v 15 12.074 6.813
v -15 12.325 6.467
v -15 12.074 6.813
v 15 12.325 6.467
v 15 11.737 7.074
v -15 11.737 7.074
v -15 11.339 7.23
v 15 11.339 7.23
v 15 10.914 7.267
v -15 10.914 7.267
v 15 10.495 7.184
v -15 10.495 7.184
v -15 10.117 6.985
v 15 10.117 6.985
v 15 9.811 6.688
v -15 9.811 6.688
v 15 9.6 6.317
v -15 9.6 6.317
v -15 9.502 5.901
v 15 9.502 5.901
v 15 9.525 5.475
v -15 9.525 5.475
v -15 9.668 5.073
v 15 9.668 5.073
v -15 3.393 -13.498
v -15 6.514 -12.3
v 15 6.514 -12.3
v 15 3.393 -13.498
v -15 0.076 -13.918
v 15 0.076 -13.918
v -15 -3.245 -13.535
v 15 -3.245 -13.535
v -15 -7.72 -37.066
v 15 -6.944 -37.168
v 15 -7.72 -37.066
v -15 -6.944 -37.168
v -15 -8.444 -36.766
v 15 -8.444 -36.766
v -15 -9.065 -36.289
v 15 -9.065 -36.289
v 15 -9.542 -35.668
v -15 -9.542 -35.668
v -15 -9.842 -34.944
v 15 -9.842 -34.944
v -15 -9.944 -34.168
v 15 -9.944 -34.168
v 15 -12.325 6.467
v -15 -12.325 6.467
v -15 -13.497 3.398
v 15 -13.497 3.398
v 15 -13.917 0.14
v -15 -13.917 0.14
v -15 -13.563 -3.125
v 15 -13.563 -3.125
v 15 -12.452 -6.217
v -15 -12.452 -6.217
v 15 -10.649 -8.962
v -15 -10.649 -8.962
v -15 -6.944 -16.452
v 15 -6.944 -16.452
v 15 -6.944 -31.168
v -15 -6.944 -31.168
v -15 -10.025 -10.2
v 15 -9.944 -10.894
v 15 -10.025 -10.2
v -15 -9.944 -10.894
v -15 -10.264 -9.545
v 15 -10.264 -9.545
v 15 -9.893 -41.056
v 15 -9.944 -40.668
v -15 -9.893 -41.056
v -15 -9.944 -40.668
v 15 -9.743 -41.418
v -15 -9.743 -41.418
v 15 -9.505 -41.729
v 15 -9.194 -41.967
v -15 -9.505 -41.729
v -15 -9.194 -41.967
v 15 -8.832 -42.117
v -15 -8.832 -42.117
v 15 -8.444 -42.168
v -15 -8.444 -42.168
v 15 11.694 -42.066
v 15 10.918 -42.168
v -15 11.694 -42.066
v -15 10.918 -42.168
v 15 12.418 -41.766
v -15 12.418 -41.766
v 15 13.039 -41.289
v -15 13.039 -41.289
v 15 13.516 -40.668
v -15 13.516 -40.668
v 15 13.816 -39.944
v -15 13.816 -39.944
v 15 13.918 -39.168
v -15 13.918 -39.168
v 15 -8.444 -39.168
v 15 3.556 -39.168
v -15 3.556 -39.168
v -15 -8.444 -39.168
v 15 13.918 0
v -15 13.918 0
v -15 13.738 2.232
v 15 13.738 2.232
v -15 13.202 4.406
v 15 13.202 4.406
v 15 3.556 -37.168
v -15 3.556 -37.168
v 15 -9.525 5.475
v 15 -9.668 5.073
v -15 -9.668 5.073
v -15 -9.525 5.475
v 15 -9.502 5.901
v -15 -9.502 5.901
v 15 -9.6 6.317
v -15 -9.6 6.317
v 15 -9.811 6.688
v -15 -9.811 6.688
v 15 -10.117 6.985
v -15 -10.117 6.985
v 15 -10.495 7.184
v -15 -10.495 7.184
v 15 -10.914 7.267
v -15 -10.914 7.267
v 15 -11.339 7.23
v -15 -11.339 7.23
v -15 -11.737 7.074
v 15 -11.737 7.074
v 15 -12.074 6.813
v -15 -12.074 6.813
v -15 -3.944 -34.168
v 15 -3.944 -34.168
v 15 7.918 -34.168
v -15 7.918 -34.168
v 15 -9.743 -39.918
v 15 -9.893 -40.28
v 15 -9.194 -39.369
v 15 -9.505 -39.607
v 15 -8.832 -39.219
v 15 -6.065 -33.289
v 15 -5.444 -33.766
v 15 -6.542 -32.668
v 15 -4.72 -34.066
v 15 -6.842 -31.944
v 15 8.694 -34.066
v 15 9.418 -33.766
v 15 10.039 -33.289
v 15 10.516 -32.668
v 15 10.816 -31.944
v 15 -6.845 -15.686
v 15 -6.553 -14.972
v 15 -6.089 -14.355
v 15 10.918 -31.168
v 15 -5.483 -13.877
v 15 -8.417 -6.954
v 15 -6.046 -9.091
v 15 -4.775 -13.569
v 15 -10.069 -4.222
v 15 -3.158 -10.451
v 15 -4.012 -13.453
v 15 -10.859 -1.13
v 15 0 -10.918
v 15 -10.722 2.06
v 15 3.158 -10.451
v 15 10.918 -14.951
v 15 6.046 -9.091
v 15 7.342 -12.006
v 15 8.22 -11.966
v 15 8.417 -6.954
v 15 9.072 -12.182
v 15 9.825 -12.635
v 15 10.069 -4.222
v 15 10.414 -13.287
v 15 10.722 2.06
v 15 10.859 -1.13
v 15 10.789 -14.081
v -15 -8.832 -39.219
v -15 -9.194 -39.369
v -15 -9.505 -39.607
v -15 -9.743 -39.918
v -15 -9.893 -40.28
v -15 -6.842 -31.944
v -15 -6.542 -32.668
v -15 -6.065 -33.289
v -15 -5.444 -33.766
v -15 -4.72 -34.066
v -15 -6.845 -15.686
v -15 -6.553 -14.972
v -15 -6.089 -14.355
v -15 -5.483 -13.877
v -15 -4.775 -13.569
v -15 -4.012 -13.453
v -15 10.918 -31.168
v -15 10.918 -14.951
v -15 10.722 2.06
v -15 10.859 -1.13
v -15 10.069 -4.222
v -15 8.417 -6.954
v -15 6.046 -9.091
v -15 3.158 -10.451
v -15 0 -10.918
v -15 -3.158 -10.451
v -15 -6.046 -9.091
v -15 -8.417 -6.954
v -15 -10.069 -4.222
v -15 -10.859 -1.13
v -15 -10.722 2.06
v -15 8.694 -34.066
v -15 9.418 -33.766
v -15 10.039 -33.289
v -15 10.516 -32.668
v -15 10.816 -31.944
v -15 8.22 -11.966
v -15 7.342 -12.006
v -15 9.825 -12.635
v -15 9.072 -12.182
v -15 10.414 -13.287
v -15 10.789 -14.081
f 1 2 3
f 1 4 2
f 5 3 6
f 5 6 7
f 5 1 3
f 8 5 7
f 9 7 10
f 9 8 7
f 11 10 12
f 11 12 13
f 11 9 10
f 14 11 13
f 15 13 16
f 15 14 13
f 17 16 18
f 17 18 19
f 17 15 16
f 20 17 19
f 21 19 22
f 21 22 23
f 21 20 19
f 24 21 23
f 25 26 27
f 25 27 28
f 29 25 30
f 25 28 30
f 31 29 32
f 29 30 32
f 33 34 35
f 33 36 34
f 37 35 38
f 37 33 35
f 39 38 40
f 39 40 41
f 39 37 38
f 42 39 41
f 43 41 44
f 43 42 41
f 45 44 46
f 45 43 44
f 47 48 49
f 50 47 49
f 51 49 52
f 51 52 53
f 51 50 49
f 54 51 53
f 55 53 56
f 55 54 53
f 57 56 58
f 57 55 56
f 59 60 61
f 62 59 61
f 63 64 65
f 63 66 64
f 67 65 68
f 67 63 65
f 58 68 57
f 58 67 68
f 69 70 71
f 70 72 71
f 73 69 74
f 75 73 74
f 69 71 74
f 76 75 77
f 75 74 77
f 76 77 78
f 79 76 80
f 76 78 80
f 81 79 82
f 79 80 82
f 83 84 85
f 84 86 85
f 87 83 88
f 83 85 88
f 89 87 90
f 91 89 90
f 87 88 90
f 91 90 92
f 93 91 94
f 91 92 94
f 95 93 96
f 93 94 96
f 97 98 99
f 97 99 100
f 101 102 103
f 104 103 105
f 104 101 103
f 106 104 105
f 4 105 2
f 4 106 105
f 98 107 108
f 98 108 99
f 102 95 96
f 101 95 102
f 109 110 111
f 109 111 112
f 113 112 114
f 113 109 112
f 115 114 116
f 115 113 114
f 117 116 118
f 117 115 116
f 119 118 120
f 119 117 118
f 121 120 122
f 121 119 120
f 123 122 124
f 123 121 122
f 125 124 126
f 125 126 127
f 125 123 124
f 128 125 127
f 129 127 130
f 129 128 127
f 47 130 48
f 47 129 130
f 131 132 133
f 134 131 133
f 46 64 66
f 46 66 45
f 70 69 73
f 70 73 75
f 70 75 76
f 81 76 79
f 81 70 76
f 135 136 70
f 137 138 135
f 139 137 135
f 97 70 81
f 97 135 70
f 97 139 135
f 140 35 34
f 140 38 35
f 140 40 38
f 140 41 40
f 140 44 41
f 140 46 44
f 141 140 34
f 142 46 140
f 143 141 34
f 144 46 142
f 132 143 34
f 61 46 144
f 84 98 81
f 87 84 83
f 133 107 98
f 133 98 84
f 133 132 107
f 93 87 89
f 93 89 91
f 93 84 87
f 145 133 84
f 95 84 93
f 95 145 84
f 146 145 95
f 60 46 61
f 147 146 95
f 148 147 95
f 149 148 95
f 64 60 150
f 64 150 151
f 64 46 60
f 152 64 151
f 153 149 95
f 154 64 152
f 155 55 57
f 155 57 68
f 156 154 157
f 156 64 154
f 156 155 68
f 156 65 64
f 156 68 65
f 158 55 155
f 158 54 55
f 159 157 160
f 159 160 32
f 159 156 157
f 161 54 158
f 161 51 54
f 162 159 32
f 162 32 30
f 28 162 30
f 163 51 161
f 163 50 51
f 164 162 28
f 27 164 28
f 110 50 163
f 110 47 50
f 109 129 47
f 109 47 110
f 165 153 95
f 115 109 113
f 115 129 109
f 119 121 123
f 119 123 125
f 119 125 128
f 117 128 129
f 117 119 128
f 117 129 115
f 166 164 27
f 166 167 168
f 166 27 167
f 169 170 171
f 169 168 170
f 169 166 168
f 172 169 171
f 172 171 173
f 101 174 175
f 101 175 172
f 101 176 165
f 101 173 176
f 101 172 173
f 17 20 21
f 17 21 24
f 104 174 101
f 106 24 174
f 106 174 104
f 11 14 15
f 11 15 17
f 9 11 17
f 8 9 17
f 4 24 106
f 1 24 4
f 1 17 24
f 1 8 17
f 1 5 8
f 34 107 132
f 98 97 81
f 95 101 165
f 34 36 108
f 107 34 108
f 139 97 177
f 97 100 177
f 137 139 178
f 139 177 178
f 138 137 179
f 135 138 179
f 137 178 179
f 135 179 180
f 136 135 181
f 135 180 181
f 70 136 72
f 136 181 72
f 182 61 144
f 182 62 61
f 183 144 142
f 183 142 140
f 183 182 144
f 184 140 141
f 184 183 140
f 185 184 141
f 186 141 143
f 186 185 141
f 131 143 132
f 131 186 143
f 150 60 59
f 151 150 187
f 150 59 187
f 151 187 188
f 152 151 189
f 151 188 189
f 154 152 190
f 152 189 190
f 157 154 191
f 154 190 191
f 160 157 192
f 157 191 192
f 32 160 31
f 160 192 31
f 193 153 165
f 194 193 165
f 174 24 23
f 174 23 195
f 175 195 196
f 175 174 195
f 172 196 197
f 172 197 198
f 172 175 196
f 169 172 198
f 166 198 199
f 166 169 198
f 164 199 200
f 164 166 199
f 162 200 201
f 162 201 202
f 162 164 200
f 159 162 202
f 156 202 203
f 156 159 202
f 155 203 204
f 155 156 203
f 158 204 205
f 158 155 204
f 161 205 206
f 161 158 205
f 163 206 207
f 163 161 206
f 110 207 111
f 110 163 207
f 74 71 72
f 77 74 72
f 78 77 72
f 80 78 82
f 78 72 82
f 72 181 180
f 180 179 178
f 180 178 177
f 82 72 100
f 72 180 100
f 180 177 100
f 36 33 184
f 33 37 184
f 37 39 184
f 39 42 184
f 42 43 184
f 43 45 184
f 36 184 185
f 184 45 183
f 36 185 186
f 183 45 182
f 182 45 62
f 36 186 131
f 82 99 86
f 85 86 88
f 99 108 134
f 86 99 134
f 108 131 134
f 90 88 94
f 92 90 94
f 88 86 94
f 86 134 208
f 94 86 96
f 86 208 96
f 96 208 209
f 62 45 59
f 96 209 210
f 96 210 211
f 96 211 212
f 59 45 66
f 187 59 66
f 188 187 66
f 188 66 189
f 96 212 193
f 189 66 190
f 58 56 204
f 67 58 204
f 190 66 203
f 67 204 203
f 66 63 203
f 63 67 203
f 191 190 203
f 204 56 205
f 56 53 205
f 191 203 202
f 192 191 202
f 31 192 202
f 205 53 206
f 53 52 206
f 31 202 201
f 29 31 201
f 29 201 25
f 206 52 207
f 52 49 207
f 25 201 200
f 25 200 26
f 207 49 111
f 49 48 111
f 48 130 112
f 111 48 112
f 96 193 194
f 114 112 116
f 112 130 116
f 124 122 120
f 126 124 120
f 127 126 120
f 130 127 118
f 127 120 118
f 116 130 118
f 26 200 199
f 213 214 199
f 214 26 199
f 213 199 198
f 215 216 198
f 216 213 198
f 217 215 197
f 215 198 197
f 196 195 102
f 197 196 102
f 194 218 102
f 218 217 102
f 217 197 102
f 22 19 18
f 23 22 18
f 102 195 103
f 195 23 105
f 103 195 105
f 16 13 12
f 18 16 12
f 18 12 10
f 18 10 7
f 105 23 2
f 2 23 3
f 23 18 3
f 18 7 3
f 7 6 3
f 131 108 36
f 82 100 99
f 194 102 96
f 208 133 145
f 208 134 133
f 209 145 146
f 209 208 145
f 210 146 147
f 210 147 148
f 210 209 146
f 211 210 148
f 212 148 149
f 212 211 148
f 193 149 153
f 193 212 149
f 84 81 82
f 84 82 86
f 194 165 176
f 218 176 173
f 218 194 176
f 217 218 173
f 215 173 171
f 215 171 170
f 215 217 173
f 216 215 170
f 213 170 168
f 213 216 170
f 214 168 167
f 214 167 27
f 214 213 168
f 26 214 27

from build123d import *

# Parameters (mm, degrees)
F1_DEPTH = 15
F3_DEPTH = 30
F4_R     = 1.49999
F6_DEPTH = 30.001
F7_R     = 3


# Not quite as in the source:
# - a fillet or chamfer is up to 0.001 mm smaller than in the source, because OpenCascade refuses the exact size


with BuildPart() as f1:
    # F0 (on Right) → F1 (new body, symmetric)
    with BuildSketch(Plane.YZ):
        with BuildLine():
            ThreePointArc((12.3245305001, 6.4665811641), (10.2993352496, 7.0979164137), (9.668, 5.0727211632))
            ThreePointArc((9.668, 5.0727211632), (0, -10.918), (-9.668, 5.0727211632))
            ThreePointArc((-9.668, 5.0727211632), (-10.2993352496, 7.0979164137), (-12.3245305001, 6.4665811641))
            ThreePointArc((-12.3245305001, 6.4665811641), (0, -13.918), (12.3245305001, 6.4665811641))
        make_face()
    extrude(amount=F1_DEPTH, both=True)

    # F2 (on face) → F3 (join, through all)
    with BuildSketch(Plane.YZ.offset(15)):
        with BuildLine():
            ThreePointArc((13.918, 0), (5.2588084202, -12.886258495), (-9.944, -9.7379457793))
            Line((-9.944, -9.7379457793), (-9.944, -37.168))
            Line((-9.944, -37.168), (3.556, -37.168))
            Line((3.556, -37.168), (3.556, -39.168))
            Line((3.556, -39.168), (-9.944, -39.168))
            Line((-9.944, -39.168), (-9.944, -42.168))
            Line((-9.944, -42.168), (13.918, -42.168))
            Line((13.918, -42.168), (13.918, 0))
        make_face()
    extrude(amount=-F3_DEPTH)

    # F4 (radius 1.5 in the source; OpenCascade refuses exactly that, so slightly less here)
    f4_edges = [f1.edges().sort_by_distance(p)[0] for p in [
        (0, -9.944, -39.168),
        (0, -9.944, -42.168),
    ]]
    fillet(f4_edges, radius=F4_R)

    # F5 (on face) → F6 (cut, through all)
    with BuildSketch(Plane.YZ.offset(15)):
        with BuildLine():
            ThreePointArc((10.918, -8.6318016659), (2.6248268424, -13.6682481704), (-6.944, -12.0619893882))
            Line((-6.944, -12.0619893882), (-6.944, -34.168))
            Line((-6.944, -34.168), (10.918, -34.168))
            Line((10.918, -34.168), (10.918, -8.6318016659))
        make_face()
    extrude(amount=-F6_DEPTH, mode=Mode.SUBTRACT)

    # F7
    f7_edges = [f1.edges().sort_by_distance(p)[0] for p in [
        (0, -9.944, -9.737946),
        (0, -9.944, -37.168),
        (0, 13.918, -42.168),
        (0, -6.944, -12.061989),
        (0, 10.918, -8.631802),
        (0, 10.918, -34.168),
        (0, -6.944, -34.168),
    ]]
    fillet(f7_edges, radius=F7_R)


solid = f1.part
